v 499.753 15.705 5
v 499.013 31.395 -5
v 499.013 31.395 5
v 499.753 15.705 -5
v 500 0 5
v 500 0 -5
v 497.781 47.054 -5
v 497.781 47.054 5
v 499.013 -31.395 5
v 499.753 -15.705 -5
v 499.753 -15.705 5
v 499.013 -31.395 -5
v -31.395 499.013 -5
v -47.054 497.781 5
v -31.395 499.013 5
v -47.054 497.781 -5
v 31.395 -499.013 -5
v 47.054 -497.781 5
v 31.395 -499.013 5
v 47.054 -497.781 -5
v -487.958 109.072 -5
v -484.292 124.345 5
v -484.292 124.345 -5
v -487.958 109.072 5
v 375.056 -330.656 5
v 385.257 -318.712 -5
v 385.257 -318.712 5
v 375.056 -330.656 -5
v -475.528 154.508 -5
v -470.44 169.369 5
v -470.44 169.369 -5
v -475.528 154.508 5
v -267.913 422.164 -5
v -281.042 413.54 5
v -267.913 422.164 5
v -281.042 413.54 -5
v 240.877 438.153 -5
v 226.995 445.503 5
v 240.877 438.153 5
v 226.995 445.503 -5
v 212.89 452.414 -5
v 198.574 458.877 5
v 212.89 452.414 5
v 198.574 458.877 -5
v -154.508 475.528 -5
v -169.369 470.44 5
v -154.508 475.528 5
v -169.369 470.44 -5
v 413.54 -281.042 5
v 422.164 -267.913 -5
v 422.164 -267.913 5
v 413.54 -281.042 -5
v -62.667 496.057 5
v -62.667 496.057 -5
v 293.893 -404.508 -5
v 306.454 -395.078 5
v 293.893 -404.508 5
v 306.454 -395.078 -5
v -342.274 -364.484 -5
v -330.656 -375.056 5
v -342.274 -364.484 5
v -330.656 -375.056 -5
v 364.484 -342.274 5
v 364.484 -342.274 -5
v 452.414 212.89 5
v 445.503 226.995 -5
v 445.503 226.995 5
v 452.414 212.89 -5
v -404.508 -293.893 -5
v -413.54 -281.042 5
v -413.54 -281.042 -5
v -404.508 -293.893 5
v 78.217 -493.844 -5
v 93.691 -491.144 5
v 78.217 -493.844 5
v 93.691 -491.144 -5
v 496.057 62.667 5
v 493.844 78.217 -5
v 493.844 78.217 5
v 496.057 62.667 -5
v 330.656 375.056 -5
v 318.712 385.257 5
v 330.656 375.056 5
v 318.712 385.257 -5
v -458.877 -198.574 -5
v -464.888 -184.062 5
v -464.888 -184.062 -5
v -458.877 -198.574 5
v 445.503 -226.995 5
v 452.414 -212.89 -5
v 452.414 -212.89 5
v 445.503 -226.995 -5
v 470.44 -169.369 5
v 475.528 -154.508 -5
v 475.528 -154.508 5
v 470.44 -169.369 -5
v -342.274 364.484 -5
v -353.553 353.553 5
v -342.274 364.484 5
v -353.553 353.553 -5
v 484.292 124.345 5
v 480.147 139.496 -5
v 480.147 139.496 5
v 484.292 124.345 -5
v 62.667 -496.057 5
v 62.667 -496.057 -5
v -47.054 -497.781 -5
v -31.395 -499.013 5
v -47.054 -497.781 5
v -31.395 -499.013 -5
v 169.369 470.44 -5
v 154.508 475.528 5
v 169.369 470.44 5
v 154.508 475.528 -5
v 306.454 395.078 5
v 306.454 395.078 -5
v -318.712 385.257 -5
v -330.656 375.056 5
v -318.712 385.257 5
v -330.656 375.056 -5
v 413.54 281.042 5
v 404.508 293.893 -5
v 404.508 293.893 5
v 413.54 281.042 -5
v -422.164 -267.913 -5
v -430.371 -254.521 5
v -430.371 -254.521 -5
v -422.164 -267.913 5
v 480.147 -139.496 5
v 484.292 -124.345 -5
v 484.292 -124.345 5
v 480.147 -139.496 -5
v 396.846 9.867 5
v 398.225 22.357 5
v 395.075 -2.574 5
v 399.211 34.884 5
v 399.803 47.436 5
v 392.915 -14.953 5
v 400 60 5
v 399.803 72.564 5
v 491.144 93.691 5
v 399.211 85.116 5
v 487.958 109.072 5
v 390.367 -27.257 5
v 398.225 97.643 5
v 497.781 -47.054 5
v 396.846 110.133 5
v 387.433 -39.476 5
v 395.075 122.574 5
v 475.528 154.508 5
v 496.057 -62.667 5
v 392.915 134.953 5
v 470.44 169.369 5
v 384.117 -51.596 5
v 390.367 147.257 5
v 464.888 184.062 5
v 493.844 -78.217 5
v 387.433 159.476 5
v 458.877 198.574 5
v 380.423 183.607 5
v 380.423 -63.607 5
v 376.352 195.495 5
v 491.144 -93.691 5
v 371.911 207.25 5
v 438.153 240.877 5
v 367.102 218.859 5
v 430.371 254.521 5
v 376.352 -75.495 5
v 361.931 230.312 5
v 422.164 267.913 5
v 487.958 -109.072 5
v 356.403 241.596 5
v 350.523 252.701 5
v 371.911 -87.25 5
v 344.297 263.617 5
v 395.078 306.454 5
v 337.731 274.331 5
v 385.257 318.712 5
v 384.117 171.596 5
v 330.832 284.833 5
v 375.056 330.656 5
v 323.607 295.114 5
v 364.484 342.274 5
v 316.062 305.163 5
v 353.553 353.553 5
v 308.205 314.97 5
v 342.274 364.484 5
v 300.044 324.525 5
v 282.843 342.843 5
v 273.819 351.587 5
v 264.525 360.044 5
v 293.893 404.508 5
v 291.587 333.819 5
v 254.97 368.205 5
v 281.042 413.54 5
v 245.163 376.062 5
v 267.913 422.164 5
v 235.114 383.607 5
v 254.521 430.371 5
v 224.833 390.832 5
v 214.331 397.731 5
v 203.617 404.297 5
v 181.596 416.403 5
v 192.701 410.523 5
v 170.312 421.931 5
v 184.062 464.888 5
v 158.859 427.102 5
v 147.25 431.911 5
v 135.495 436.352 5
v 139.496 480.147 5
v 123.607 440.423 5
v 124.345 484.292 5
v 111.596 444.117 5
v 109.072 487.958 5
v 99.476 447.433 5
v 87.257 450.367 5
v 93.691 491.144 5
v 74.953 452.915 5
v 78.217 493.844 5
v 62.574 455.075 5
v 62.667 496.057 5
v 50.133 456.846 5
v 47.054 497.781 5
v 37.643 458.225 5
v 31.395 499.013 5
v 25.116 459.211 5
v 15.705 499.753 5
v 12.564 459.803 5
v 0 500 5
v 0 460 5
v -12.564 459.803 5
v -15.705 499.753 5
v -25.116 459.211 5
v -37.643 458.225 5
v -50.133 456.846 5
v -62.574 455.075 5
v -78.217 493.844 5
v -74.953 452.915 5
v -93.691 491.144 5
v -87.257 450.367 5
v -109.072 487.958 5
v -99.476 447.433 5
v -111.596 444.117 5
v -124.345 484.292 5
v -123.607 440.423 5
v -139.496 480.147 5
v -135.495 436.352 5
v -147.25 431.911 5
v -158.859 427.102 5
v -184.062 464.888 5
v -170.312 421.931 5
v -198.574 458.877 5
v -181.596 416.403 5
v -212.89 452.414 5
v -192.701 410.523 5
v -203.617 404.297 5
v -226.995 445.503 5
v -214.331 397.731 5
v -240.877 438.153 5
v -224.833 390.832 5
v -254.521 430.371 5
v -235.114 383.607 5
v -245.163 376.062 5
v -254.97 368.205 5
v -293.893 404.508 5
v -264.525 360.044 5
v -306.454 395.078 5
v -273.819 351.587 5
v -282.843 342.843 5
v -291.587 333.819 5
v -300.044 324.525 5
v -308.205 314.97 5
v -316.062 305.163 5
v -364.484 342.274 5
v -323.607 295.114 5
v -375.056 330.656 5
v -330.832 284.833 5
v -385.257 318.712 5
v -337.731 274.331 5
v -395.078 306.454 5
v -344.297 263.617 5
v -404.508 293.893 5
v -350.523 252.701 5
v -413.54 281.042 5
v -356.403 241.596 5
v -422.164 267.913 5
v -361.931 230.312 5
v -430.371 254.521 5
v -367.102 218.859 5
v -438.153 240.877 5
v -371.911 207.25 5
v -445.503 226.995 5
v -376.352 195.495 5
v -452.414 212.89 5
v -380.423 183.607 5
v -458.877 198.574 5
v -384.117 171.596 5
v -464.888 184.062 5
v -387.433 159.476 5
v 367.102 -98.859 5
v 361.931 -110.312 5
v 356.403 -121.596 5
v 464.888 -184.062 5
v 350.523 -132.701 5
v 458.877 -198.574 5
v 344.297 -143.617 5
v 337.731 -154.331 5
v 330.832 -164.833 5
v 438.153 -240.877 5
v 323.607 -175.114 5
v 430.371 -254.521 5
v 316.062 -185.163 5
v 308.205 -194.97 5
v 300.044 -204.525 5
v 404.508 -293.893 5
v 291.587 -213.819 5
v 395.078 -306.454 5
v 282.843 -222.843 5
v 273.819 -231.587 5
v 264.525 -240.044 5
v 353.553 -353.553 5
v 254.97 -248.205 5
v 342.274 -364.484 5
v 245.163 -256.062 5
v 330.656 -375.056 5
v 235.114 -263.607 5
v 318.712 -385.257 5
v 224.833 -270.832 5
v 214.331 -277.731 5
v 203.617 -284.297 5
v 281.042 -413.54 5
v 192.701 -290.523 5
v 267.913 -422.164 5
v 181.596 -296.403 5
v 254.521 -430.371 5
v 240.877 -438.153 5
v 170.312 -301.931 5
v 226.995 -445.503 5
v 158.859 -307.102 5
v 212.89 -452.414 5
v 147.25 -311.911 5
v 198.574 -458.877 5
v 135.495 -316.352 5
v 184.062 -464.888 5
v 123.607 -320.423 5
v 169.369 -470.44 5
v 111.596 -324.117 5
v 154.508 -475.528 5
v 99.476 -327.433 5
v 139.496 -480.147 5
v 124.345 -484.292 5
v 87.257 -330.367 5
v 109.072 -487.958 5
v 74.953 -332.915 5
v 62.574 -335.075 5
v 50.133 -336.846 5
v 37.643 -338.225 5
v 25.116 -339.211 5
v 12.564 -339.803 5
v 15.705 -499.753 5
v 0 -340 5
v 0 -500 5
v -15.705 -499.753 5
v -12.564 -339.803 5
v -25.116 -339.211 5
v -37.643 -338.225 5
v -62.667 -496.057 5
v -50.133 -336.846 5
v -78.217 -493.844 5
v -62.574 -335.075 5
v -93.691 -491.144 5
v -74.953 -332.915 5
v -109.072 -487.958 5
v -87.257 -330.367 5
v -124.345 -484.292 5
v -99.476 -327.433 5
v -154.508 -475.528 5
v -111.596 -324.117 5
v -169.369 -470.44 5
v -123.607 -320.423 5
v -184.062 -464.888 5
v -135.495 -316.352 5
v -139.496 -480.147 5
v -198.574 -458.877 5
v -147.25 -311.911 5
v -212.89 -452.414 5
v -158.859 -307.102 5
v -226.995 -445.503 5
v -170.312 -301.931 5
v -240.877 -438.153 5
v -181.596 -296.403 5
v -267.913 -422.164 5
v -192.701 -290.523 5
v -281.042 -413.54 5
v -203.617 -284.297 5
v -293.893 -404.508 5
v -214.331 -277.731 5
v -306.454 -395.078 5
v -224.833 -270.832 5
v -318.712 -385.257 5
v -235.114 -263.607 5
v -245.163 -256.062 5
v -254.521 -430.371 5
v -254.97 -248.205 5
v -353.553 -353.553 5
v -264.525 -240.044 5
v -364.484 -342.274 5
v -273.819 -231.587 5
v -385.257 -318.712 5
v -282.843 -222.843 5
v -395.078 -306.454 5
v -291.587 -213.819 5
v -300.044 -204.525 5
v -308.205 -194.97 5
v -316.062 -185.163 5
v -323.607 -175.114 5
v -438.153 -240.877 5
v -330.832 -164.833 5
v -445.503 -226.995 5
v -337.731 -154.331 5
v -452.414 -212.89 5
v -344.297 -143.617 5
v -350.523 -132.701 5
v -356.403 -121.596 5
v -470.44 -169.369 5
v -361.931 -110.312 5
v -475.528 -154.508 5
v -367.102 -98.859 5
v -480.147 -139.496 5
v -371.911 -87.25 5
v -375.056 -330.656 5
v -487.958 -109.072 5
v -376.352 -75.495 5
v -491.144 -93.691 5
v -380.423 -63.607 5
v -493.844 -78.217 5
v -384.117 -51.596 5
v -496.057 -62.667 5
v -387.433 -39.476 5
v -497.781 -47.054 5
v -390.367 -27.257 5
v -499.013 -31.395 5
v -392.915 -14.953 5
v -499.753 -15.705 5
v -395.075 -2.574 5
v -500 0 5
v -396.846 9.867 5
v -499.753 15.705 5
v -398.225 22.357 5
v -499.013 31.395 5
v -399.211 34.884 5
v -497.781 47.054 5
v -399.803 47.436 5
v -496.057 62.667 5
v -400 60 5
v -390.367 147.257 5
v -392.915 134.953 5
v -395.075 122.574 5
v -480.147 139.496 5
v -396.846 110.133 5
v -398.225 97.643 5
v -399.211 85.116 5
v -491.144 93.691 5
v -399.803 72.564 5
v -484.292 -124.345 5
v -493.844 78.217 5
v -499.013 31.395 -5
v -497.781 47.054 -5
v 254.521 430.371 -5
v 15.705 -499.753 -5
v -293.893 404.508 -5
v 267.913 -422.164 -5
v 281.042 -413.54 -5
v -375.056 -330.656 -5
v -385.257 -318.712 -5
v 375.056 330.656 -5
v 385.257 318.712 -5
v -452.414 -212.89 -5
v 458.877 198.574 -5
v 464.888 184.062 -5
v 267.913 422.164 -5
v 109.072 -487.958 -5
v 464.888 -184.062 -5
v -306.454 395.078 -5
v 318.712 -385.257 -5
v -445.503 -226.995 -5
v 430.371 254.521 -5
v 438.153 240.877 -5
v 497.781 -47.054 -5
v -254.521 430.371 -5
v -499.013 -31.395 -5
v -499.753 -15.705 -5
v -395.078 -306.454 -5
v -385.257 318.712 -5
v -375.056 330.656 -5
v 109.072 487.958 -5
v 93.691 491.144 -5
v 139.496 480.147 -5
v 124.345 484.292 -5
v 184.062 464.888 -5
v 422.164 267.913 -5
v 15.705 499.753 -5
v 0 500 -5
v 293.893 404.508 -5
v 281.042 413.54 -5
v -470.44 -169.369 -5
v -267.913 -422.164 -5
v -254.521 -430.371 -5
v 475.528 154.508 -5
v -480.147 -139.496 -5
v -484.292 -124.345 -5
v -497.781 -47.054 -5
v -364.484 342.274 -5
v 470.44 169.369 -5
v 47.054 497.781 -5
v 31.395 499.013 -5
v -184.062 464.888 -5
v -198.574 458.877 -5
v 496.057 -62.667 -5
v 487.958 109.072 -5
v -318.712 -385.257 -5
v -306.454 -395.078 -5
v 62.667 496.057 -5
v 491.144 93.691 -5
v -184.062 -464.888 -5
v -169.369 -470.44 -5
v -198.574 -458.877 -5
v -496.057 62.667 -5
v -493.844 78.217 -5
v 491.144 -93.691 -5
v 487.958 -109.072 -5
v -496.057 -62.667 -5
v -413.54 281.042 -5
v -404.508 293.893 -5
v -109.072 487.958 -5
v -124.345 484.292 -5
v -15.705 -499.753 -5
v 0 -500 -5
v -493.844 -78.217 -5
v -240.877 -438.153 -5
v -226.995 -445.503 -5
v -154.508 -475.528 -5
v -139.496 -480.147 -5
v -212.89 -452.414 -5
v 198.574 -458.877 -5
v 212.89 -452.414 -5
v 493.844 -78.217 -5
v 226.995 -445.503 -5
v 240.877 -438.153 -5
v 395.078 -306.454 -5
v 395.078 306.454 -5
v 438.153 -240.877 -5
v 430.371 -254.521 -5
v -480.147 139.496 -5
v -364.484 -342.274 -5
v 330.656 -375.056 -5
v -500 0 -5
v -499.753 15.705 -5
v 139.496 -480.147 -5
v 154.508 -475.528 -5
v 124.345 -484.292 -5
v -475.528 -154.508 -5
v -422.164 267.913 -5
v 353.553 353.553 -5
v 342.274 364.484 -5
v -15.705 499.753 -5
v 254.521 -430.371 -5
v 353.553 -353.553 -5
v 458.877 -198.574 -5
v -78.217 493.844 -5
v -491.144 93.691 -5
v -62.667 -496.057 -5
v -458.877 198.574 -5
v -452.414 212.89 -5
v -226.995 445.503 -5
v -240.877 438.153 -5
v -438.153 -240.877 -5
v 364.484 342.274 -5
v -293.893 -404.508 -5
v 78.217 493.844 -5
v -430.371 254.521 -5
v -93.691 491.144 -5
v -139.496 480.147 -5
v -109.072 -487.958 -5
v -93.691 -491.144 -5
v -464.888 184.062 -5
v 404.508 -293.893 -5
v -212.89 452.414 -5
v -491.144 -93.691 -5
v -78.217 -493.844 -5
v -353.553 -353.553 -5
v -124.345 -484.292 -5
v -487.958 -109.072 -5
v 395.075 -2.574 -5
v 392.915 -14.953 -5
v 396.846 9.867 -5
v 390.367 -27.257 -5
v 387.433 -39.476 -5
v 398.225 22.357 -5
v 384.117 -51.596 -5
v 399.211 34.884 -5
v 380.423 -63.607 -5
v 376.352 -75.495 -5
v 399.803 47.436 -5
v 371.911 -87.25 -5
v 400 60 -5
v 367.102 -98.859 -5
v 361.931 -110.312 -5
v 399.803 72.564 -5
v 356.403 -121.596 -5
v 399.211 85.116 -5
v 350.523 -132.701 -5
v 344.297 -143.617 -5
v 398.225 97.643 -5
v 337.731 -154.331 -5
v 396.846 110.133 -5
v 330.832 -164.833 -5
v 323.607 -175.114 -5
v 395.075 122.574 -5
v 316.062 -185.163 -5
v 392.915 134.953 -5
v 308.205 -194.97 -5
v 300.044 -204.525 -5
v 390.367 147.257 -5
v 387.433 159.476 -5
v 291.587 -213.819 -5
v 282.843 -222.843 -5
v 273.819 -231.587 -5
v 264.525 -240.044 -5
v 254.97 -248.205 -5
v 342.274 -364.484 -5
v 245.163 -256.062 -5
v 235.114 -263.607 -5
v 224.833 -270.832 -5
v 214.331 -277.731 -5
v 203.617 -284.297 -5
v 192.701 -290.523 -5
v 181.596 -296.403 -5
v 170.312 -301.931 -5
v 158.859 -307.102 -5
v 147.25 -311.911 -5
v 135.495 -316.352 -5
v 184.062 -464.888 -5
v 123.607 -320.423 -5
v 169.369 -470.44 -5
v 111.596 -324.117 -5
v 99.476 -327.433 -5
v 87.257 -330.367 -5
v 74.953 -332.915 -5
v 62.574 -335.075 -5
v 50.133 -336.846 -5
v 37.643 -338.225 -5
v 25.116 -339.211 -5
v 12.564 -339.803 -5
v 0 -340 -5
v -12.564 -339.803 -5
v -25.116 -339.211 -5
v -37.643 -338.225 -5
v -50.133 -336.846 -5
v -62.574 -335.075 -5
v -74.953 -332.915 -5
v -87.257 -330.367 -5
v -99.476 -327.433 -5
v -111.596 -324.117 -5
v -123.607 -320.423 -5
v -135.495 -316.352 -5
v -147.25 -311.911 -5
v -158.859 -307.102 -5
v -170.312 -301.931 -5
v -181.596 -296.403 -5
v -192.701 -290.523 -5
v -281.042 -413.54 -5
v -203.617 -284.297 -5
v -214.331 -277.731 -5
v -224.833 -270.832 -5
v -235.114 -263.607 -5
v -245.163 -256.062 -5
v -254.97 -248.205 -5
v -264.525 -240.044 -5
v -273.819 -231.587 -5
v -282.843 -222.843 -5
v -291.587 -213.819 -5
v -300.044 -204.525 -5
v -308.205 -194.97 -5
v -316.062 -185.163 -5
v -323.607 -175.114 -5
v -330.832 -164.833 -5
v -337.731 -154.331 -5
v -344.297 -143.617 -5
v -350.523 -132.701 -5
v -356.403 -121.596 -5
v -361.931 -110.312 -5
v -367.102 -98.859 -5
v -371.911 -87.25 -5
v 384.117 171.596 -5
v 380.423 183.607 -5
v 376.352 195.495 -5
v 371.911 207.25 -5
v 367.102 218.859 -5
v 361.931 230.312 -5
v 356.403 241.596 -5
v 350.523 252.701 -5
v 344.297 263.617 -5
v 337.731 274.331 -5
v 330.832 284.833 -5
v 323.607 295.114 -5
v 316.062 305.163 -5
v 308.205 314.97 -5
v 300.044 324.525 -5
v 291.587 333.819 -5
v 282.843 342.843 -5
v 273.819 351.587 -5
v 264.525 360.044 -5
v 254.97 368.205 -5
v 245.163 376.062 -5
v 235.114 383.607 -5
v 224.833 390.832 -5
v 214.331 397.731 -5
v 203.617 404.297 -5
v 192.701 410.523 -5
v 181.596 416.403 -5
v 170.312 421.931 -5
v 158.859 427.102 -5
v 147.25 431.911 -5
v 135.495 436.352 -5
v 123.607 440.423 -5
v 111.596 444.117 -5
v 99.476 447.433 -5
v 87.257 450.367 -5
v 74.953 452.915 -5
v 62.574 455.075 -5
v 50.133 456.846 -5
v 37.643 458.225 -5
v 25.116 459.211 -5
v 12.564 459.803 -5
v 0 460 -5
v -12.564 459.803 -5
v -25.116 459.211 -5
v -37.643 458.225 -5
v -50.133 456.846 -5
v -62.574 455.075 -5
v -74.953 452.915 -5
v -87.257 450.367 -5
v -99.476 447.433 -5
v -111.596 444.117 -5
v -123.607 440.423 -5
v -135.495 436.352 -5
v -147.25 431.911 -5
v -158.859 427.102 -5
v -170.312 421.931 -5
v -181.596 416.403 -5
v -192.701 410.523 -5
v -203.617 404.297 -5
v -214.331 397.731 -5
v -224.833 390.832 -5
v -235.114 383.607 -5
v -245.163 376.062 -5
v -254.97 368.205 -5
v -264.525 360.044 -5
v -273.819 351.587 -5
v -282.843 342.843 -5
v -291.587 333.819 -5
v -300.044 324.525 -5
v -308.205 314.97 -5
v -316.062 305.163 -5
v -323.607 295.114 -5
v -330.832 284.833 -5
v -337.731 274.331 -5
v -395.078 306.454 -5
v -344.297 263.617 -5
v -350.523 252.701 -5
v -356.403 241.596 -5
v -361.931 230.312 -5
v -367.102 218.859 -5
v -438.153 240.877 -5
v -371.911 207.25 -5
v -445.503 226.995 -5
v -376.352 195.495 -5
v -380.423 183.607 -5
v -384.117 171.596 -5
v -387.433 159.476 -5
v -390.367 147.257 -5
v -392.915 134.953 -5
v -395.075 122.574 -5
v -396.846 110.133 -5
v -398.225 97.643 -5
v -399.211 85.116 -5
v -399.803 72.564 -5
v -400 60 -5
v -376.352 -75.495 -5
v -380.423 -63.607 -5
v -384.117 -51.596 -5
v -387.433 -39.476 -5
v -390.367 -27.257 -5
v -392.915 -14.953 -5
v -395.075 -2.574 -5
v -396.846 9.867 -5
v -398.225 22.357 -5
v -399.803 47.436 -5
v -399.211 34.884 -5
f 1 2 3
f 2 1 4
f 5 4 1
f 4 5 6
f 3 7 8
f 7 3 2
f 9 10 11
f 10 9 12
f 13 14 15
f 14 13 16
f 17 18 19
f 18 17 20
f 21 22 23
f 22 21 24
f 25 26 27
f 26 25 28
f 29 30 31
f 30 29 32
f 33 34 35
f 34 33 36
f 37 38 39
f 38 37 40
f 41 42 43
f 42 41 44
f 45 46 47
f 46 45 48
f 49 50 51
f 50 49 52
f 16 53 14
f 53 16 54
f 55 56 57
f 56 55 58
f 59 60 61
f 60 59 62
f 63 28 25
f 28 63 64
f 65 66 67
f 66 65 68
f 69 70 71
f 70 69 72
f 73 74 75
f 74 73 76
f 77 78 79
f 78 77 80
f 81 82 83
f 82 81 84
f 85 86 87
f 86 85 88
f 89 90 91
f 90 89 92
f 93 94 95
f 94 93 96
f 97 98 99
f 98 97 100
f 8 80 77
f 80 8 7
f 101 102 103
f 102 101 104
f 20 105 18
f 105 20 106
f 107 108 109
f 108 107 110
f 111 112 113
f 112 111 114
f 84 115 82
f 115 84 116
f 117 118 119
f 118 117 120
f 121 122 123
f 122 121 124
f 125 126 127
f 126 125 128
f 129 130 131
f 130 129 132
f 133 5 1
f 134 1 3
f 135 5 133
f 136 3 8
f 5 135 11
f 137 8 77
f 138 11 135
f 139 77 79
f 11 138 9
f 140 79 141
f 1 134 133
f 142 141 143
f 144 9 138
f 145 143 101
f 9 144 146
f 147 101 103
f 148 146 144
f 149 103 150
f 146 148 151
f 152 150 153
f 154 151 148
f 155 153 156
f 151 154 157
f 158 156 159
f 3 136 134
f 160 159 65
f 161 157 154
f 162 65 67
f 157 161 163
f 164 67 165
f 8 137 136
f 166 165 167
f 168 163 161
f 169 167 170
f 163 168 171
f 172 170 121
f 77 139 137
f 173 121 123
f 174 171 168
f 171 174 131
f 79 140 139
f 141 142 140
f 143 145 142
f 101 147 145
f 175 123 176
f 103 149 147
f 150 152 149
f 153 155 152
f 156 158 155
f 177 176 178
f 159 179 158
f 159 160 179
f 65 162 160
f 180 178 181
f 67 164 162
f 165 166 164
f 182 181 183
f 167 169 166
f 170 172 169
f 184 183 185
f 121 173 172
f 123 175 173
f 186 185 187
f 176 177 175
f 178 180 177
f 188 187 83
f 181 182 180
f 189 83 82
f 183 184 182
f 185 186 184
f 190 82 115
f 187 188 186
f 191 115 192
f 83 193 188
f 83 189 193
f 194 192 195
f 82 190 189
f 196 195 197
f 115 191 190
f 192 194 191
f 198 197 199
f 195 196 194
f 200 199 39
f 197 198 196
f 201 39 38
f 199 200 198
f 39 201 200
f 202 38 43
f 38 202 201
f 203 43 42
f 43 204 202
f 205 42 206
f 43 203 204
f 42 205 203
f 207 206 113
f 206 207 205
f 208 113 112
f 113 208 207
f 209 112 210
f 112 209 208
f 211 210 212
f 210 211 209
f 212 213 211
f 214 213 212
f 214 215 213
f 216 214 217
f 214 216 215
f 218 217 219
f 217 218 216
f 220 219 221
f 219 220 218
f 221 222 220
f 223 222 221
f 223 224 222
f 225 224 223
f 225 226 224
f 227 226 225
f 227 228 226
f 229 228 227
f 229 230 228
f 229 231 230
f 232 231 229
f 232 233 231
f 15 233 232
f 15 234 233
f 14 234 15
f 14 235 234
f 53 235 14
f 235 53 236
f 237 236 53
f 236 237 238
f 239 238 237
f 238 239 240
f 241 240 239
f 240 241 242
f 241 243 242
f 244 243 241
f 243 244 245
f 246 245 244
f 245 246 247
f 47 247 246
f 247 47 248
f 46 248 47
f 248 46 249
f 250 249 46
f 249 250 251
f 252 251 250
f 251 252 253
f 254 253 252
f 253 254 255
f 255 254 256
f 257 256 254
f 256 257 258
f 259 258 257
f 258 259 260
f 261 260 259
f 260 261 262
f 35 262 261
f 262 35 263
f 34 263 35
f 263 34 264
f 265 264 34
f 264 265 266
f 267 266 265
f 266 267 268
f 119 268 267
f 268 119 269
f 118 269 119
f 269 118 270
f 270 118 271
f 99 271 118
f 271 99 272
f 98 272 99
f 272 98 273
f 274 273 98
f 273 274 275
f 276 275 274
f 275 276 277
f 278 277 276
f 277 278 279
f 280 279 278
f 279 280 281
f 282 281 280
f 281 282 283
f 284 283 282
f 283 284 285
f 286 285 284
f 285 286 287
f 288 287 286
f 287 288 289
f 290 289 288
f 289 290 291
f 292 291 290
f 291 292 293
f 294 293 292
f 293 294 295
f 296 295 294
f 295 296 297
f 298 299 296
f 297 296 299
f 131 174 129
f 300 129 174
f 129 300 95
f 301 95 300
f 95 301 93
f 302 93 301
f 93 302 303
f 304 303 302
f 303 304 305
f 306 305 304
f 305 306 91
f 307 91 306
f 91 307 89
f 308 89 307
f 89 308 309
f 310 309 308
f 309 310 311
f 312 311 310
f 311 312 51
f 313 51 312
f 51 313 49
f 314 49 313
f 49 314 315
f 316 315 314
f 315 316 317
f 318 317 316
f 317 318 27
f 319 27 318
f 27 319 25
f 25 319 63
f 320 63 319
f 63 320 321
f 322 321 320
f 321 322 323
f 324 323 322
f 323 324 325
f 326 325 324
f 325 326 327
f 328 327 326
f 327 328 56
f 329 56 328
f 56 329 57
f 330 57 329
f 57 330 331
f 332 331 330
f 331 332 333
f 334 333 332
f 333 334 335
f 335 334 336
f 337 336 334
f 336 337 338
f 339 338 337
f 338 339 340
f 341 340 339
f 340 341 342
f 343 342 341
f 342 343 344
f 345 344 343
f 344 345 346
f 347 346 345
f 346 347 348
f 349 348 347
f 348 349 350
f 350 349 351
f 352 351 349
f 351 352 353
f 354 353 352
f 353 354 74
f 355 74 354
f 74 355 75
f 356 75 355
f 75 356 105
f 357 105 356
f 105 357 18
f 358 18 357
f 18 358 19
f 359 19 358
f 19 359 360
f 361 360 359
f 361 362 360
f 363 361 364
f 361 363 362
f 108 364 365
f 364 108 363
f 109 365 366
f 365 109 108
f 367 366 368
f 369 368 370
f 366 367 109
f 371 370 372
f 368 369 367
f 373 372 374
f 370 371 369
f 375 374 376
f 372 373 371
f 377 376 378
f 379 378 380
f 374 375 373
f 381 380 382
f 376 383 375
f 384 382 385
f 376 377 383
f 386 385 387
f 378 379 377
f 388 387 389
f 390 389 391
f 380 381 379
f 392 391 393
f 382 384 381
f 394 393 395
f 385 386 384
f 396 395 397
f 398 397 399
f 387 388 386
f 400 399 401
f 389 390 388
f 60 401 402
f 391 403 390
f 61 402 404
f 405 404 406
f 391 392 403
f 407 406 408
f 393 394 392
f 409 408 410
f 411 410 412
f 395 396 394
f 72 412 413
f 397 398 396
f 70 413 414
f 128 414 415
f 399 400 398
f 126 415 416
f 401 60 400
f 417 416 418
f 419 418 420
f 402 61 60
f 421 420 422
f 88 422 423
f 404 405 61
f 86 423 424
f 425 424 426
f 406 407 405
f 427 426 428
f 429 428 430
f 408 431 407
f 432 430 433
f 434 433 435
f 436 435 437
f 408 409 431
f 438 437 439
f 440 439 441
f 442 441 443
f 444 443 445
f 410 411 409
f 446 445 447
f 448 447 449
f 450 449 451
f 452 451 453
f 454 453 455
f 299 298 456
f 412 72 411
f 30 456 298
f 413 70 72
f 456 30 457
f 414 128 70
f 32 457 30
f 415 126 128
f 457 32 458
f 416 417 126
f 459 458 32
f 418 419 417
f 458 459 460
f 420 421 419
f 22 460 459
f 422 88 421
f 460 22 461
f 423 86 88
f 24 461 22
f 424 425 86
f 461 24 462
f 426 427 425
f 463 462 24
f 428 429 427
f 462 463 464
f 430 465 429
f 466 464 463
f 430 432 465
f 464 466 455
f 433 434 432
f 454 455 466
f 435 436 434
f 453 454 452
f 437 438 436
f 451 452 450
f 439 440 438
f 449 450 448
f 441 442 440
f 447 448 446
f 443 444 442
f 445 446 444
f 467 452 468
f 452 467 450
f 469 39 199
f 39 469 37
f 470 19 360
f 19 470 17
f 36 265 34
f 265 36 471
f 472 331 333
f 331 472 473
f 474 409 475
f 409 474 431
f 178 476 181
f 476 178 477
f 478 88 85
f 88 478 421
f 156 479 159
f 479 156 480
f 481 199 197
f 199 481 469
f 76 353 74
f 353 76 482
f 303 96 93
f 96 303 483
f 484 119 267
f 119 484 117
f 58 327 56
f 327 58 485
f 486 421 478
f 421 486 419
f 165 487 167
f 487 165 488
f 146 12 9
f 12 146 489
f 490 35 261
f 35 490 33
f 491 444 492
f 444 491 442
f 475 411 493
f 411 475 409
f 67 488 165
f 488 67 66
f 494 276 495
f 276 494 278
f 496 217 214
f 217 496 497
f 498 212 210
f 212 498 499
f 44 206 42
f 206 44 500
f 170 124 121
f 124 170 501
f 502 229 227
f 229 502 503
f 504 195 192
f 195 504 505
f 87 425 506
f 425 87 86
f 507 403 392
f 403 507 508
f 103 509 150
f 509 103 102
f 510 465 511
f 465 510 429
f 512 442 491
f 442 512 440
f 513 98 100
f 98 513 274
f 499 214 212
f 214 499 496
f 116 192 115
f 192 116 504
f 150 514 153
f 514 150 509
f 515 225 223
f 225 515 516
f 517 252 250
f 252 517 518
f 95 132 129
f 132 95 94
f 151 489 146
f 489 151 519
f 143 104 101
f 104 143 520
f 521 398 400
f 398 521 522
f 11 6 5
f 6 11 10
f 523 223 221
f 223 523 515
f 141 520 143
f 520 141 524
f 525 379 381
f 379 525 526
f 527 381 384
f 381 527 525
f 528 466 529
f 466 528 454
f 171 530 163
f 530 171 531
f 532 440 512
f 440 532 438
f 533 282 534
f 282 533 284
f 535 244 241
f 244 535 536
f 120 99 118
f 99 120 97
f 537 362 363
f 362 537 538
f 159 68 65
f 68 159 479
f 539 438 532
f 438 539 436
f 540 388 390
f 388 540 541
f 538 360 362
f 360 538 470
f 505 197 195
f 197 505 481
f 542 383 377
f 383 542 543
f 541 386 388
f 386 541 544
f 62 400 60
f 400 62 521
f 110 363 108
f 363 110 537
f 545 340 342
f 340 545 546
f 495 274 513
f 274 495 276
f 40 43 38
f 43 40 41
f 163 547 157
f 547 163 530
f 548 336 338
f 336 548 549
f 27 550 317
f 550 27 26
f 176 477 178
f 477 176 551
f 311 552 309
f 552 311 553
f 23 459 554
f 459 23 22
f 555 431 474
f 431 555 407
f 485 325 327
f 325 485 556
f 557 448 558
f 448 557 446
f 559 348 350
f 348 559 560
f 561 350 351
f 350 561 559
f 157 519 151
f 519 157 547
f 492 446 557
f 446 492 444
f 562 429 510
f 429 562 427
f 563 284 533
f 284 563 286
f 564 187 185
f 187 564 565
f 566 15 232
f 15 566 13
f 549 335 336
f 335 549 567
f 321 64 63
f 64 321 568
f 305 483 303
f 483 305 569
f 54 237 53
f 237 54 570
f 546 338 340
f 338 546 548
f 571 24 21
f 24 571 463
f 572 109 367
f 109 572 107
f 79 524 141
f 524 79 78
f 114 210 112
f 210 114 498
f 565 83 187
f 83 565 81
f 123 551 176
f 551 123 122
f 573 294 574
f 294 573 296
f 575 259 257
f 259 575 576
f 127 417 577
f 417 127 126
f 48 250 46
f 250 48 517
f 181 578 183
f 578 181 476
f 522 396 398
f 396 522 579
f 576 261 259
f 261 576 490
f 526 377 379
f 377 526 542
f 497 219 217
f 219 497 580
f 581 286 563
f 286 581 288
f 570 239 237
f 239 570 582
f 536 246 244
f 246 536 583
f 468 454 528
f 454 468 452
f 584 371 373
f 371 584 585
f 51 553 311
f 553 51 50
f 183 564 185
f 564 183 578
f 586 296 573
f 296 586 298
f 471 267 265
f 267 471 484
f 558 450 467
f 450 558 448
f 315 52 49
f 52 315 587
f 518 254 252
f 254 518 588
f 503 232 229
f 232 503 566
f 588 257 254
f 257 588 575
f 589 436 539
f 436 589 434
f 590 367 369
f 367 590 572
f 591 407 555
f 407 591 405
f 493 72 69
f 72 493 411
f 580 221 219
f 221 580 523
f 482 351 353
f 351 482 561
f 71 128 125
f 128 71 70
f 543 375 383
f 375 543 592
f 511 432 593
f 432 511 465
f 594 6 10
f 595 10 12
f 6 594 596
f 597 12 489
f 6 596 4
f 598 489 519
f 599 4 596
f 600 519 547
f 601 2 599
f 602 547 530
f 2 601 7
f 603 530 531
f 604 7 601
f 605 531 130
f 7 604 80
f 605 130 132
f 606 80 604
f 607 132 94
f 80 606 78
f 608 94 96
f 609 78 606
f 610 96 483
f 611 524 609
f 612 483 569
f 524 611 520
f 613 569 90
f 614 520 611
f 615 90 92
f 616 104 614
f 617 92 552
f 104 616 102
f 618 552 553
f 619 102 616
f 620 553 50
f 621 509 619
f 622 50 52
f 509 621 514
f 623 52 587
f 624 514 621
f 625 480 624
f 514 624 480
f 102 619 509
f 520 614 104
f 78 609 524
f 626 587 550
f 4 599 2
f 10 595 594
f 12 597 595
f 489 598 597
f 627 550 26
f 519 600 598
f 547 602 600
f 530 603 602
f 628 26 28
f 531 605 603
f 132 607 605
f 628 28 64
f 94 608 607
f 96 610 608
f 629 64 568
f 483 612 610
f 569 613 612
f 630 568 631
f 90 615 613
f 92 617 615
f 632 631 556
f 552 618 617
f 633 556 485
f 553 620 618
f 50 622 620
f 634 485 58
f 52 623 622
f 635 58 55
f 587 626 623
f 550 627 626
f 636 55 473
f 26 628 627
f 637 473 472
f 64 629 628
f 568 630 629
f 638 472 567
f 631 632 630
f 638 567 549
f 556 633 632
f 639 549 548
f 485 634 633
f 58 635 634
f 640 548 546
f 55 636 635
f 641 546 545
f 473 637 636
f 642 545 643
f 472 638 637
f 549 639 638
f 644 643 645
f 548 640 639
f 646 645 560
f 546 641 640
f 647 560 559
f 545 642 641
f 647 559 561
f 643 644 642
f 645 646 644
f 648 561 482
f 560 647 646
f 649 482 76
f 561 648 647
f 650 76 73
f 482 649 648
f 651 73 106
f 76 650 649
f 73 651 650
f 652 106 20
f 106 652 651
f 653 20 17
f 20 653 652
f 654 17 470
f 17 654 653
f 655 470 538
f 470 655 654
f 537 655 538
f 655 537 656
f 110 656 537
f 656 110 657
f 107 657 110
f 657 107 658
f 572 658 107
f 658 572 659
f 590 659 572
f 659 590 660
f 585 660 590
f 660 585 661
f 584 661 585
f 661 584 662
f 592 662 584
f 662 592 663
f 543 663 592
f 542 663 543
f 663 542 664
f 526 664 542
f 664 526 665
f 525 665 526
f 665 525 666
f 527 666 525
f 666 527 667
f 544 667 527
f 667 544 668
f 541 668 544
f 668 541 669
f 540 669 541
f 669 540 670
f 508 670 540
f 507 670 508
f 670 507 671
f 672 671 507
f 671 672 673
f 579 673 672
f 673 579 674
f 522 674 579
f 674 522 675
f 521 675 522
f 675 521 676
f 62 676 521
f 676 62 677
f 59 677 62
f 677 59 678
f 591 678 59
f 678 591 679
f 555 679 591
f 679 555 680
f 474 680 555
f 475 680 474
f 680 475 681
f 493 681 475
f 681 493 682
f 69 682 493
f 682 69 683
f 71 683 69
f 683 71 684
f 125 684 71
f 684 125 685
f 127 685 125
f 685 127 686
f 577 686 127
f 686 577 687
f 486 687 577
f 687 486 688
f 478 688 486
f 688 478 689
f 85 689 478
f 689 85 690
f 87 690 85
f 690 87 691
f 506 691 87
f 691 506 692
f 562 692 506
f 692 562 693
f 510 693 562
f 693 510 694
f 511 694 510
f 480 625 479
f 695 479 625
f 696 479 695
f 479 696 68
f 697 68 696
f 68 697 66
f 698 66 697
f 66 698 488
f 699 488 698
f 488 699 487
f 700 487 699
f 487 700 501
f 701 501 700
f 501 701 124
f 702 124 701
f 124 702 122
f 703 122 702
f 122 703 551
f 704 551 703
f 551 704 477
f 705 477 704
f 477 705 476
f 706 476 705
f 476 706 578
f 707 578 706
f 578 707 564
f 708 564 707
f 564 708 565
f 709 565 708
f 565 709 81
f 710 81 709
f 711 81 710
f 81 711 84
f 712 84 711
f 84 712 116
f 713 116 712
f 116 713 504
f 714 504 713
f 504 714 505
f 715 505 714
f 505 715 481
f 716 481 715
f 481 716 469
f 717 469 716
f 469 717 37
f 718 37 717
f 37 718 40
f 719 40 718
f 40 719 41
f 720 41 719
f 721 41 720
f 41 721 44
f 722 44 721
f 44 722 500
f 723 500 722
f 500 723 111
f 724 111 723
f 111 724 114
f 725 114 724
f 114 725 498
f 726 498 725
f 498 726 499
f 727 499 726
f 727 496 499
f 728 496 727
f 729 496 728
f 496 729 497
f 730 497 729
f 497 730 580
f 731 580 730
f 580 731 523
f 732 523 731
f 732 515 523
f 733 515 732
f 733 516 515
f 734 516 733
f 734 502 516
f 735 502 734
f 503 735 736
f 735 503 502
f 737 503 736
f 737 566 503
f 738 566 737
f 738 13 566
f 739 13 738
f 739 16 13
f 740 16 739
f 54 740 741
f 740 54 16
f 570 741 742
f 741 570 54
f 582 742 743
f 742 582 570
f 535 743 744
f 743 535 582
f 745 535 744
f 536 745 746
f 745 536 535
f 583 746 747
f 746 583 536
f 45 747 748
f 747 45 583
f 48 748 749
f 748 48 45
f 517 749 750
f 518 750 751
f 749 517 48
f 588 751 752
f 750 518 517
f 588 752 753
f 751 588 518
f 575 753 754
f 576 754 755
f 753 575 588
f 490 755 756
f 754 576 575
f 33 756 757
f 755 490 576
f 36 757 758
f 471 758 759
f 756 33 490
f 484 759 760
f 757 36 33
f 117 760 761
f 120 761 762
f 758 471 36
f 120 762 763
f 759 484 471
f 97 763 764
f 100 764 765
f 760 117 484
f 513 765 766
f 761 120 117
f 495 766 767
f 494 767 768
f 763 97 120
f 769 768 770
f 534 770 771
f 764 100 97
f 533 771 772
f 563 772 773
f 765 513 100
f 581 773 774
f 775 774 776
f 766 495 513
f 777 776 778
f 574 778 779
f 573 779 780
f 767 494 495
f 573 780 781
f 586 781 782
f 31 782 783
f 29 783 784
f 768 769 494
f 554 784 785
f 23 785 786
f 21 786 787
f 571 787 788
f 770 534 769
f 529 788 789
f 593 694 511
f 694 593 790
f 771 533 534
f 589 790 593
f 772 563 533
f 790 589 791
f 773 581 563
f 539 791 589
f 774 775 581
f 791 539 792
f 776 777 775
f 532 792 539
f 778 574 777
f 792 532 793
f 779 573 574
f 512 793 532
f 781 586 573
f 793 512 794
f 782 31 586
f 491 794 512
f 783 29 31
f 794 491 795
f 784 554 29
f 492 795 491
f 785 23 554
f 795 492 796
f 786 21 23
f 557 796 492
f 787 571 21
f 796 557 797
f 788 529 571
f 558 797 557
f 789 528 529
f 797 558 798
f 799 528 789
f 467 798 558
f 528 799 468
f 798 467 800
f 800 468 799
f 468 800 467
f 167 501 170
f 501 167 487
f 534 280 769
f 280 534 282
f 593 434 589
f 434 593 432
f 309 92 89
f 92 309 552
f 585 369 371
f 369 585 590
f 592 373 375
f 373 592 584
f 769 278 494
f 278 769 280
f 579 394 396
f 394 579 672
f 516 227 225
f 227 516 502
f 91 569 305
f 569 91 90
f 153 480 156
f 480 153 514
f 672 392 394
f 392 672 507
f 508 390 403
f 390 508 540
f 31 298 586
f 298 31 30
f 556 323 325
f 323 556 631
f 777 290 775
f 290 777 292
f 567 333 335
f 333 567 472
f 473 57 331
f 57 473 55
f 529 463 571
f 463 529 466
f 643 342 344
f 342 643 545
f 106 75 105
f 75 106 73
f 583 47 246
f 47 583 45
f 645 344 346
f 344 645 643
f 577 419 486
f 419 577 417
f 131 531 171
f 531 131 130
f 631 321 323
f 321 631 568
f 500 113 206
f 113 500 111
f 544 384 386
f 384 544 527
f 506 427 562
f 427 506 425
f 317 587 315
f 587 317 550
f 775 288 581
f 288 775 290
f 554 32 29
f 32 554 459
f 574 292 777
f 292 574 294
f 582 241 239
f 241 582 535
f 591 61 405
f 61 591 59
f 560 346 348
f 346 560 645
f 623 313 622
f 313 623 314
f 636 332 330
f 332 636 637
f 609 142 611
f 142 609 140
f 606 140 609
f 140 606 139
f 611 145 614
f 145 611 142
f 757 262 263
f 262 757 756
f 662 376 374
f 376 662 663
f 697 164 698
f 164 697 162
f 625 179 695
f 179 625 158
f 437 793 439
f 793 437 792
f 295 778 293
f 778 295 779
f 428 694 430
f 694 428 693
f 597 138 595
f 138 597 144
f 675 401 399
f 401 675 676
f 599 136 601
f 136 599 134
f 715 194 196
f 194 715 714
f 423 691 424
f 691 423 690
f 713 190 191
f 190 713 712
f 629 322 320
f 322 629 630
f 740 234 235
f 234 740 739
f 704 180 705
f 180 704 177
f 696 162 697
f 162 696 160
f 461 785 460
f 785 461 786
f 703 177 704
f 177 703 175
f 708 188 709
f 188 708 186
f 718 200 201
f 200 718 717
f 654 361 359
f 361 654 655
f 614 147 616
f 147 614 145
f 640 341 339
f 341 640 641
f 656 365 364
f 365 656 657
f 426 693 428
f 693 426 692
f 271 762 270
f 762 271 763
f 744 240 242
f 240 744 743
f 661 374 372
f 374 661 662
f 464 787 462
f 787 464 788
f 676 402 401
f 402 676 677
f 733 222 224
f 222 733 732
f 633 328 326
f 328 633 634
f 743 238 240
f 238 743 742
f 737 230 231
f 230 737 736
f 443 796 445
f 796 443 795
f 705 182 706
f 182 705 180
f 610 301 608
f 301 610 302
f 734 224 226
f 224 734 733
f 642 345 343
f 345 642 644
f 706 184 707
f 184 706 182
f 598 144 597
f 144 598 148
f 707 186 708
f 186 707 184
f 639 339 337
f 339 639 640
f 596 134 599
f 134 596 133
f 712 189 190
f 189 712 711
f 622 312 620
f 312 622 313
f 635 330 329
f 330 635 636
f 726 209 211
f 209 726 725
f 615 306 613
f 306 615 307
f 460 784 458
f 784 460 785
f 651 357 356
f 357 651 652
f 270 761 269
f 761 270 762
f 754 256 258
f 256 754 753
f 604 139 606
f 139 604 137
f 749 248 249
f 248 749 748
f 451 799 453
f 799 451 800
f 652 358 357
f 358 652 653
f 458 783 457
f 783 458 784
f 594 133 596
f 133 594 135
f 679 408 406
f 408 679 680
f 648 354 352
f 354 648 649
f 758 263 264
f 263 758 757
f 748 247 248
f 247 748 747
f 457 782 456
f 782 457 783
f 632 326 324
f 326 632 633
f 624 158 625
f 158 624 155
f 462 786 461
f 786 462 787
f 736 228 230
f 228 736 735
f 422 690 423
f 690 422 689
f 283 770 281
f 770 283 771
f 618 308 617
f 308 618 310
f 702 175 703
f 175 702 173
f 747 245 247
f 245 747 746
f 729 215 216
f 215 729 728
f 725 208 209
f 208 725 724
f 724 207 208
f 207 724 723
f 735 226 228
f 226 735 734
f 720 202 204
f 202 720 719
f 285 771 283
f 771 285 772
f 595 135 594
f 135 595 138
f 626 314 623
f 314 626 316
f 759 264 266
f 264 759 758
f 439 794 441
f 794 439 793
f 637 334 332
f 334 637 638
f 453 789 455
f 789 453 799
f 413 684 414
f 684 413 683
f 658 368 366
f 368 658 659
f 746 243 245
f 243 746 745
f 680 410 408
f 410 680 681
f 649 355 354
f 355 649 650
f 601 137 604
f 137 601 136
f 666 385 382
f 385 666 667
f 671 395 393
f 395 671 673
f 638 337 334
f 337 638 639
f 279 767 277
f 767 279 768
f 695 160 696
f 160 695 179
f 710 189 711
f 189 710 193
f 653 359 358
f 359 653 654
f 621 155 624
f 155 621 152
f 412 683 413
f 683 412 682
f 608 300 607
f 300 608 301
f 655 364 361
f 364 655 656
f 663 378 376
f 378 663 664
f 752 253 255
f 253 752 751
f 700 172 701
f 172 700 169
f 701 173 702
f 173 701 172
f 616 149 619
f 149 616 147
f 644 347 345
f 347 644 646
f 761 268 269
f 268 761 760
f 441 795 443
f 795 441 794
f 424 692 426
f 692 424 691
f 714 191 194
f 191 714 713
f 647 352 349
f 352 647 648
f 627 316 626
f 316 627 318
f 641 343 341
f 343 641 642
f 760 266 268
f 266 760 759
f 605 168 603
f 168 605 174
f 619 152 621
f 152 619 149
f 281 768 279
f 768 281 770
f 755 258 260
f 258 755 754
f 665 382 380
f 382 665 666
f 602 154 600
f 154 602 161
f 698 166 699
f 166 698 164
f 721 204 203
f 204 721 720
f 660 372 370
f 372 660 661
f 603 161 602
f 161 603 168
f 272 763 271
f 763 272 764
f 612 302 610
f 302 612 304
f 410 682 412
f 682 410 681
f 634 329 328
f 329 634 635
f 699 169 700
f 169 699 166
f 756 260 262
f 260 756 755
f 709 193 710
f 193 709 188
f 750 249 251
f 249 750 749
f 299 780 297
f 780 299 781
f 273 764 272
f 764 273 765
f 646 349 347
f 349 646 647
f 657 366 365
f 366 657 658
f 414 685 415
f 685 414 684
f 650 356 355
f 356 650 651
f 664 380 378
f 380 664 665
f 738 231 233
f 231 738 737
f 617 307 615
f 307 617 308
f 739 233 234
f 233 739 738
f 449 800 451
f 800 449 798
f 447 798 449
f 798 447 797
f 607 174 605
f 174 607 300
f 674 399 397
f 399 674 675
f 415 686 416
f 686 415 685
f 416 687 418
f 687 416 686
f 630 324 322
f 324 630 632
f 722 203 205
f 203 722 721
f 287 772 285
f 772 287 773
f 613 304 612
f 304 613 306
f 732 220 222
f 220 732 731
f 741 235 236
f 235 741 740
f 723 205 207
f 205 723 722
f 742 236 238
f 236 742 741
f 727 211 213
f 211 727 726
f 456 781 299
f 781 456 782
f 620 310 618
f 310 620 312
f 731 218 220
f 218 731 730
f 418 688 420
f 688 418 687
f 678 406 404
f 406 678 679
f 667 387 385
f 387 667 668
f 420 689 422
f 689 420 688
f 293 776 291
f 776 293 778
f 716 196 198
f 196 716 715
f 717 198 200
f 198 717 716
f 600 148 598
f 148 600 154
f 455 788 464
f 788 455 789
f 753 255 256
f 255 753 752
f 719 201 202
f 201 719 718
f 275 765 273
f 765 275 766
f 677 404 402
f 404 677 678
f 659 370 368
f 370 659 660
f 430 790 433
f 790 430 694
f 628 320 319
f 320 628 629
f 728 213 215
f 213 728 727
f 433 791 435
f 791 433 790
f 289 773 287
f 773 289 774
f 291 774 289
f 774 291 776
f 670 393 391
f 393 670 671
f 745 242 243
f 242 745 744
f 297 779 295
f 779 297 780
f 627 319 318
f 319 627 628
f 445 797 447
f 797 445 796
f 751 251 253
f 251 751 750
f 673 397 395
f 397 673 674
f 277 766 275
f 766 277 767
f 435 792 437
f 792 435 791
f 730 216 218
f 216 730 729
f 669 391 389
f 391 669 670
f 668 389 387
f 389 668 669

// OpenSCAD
// file: Global.scad
chassisLength = 190;
chassisWidth = 130;
sensorHoleSize = 2.68;
sensorDistanceBetween = 12.9;
sensorSize = 20.65;
legoHole = 4.8;
motorLength = 107.8;
arrayBetween = 7.215;
arraySize = 72.53;
arrayHoleToSide = 3.35;
portSize = 14.16;
motorHeight = 45.61;
motorWidth = 39.71;
motorTopToHolesRow = 18.12;
motorEndToHoles = 69.80;
motorEndToBottom = 22.25;
nxtLength = 111.54;
nxtWidth = 71.73;
nxtDepth = 39.88;
nxtDistToFirstHole = 10.97;
nxtLengthToFirstHole = 6.35;
// main file
include <Global.scad>
$fn = 200;

difference()
{
    cylinder(h = 10,r = 500, center = true);
    translate([0,60,0])
    {
        cylinder(h = 10,r = 400, center = true);
    }
}
